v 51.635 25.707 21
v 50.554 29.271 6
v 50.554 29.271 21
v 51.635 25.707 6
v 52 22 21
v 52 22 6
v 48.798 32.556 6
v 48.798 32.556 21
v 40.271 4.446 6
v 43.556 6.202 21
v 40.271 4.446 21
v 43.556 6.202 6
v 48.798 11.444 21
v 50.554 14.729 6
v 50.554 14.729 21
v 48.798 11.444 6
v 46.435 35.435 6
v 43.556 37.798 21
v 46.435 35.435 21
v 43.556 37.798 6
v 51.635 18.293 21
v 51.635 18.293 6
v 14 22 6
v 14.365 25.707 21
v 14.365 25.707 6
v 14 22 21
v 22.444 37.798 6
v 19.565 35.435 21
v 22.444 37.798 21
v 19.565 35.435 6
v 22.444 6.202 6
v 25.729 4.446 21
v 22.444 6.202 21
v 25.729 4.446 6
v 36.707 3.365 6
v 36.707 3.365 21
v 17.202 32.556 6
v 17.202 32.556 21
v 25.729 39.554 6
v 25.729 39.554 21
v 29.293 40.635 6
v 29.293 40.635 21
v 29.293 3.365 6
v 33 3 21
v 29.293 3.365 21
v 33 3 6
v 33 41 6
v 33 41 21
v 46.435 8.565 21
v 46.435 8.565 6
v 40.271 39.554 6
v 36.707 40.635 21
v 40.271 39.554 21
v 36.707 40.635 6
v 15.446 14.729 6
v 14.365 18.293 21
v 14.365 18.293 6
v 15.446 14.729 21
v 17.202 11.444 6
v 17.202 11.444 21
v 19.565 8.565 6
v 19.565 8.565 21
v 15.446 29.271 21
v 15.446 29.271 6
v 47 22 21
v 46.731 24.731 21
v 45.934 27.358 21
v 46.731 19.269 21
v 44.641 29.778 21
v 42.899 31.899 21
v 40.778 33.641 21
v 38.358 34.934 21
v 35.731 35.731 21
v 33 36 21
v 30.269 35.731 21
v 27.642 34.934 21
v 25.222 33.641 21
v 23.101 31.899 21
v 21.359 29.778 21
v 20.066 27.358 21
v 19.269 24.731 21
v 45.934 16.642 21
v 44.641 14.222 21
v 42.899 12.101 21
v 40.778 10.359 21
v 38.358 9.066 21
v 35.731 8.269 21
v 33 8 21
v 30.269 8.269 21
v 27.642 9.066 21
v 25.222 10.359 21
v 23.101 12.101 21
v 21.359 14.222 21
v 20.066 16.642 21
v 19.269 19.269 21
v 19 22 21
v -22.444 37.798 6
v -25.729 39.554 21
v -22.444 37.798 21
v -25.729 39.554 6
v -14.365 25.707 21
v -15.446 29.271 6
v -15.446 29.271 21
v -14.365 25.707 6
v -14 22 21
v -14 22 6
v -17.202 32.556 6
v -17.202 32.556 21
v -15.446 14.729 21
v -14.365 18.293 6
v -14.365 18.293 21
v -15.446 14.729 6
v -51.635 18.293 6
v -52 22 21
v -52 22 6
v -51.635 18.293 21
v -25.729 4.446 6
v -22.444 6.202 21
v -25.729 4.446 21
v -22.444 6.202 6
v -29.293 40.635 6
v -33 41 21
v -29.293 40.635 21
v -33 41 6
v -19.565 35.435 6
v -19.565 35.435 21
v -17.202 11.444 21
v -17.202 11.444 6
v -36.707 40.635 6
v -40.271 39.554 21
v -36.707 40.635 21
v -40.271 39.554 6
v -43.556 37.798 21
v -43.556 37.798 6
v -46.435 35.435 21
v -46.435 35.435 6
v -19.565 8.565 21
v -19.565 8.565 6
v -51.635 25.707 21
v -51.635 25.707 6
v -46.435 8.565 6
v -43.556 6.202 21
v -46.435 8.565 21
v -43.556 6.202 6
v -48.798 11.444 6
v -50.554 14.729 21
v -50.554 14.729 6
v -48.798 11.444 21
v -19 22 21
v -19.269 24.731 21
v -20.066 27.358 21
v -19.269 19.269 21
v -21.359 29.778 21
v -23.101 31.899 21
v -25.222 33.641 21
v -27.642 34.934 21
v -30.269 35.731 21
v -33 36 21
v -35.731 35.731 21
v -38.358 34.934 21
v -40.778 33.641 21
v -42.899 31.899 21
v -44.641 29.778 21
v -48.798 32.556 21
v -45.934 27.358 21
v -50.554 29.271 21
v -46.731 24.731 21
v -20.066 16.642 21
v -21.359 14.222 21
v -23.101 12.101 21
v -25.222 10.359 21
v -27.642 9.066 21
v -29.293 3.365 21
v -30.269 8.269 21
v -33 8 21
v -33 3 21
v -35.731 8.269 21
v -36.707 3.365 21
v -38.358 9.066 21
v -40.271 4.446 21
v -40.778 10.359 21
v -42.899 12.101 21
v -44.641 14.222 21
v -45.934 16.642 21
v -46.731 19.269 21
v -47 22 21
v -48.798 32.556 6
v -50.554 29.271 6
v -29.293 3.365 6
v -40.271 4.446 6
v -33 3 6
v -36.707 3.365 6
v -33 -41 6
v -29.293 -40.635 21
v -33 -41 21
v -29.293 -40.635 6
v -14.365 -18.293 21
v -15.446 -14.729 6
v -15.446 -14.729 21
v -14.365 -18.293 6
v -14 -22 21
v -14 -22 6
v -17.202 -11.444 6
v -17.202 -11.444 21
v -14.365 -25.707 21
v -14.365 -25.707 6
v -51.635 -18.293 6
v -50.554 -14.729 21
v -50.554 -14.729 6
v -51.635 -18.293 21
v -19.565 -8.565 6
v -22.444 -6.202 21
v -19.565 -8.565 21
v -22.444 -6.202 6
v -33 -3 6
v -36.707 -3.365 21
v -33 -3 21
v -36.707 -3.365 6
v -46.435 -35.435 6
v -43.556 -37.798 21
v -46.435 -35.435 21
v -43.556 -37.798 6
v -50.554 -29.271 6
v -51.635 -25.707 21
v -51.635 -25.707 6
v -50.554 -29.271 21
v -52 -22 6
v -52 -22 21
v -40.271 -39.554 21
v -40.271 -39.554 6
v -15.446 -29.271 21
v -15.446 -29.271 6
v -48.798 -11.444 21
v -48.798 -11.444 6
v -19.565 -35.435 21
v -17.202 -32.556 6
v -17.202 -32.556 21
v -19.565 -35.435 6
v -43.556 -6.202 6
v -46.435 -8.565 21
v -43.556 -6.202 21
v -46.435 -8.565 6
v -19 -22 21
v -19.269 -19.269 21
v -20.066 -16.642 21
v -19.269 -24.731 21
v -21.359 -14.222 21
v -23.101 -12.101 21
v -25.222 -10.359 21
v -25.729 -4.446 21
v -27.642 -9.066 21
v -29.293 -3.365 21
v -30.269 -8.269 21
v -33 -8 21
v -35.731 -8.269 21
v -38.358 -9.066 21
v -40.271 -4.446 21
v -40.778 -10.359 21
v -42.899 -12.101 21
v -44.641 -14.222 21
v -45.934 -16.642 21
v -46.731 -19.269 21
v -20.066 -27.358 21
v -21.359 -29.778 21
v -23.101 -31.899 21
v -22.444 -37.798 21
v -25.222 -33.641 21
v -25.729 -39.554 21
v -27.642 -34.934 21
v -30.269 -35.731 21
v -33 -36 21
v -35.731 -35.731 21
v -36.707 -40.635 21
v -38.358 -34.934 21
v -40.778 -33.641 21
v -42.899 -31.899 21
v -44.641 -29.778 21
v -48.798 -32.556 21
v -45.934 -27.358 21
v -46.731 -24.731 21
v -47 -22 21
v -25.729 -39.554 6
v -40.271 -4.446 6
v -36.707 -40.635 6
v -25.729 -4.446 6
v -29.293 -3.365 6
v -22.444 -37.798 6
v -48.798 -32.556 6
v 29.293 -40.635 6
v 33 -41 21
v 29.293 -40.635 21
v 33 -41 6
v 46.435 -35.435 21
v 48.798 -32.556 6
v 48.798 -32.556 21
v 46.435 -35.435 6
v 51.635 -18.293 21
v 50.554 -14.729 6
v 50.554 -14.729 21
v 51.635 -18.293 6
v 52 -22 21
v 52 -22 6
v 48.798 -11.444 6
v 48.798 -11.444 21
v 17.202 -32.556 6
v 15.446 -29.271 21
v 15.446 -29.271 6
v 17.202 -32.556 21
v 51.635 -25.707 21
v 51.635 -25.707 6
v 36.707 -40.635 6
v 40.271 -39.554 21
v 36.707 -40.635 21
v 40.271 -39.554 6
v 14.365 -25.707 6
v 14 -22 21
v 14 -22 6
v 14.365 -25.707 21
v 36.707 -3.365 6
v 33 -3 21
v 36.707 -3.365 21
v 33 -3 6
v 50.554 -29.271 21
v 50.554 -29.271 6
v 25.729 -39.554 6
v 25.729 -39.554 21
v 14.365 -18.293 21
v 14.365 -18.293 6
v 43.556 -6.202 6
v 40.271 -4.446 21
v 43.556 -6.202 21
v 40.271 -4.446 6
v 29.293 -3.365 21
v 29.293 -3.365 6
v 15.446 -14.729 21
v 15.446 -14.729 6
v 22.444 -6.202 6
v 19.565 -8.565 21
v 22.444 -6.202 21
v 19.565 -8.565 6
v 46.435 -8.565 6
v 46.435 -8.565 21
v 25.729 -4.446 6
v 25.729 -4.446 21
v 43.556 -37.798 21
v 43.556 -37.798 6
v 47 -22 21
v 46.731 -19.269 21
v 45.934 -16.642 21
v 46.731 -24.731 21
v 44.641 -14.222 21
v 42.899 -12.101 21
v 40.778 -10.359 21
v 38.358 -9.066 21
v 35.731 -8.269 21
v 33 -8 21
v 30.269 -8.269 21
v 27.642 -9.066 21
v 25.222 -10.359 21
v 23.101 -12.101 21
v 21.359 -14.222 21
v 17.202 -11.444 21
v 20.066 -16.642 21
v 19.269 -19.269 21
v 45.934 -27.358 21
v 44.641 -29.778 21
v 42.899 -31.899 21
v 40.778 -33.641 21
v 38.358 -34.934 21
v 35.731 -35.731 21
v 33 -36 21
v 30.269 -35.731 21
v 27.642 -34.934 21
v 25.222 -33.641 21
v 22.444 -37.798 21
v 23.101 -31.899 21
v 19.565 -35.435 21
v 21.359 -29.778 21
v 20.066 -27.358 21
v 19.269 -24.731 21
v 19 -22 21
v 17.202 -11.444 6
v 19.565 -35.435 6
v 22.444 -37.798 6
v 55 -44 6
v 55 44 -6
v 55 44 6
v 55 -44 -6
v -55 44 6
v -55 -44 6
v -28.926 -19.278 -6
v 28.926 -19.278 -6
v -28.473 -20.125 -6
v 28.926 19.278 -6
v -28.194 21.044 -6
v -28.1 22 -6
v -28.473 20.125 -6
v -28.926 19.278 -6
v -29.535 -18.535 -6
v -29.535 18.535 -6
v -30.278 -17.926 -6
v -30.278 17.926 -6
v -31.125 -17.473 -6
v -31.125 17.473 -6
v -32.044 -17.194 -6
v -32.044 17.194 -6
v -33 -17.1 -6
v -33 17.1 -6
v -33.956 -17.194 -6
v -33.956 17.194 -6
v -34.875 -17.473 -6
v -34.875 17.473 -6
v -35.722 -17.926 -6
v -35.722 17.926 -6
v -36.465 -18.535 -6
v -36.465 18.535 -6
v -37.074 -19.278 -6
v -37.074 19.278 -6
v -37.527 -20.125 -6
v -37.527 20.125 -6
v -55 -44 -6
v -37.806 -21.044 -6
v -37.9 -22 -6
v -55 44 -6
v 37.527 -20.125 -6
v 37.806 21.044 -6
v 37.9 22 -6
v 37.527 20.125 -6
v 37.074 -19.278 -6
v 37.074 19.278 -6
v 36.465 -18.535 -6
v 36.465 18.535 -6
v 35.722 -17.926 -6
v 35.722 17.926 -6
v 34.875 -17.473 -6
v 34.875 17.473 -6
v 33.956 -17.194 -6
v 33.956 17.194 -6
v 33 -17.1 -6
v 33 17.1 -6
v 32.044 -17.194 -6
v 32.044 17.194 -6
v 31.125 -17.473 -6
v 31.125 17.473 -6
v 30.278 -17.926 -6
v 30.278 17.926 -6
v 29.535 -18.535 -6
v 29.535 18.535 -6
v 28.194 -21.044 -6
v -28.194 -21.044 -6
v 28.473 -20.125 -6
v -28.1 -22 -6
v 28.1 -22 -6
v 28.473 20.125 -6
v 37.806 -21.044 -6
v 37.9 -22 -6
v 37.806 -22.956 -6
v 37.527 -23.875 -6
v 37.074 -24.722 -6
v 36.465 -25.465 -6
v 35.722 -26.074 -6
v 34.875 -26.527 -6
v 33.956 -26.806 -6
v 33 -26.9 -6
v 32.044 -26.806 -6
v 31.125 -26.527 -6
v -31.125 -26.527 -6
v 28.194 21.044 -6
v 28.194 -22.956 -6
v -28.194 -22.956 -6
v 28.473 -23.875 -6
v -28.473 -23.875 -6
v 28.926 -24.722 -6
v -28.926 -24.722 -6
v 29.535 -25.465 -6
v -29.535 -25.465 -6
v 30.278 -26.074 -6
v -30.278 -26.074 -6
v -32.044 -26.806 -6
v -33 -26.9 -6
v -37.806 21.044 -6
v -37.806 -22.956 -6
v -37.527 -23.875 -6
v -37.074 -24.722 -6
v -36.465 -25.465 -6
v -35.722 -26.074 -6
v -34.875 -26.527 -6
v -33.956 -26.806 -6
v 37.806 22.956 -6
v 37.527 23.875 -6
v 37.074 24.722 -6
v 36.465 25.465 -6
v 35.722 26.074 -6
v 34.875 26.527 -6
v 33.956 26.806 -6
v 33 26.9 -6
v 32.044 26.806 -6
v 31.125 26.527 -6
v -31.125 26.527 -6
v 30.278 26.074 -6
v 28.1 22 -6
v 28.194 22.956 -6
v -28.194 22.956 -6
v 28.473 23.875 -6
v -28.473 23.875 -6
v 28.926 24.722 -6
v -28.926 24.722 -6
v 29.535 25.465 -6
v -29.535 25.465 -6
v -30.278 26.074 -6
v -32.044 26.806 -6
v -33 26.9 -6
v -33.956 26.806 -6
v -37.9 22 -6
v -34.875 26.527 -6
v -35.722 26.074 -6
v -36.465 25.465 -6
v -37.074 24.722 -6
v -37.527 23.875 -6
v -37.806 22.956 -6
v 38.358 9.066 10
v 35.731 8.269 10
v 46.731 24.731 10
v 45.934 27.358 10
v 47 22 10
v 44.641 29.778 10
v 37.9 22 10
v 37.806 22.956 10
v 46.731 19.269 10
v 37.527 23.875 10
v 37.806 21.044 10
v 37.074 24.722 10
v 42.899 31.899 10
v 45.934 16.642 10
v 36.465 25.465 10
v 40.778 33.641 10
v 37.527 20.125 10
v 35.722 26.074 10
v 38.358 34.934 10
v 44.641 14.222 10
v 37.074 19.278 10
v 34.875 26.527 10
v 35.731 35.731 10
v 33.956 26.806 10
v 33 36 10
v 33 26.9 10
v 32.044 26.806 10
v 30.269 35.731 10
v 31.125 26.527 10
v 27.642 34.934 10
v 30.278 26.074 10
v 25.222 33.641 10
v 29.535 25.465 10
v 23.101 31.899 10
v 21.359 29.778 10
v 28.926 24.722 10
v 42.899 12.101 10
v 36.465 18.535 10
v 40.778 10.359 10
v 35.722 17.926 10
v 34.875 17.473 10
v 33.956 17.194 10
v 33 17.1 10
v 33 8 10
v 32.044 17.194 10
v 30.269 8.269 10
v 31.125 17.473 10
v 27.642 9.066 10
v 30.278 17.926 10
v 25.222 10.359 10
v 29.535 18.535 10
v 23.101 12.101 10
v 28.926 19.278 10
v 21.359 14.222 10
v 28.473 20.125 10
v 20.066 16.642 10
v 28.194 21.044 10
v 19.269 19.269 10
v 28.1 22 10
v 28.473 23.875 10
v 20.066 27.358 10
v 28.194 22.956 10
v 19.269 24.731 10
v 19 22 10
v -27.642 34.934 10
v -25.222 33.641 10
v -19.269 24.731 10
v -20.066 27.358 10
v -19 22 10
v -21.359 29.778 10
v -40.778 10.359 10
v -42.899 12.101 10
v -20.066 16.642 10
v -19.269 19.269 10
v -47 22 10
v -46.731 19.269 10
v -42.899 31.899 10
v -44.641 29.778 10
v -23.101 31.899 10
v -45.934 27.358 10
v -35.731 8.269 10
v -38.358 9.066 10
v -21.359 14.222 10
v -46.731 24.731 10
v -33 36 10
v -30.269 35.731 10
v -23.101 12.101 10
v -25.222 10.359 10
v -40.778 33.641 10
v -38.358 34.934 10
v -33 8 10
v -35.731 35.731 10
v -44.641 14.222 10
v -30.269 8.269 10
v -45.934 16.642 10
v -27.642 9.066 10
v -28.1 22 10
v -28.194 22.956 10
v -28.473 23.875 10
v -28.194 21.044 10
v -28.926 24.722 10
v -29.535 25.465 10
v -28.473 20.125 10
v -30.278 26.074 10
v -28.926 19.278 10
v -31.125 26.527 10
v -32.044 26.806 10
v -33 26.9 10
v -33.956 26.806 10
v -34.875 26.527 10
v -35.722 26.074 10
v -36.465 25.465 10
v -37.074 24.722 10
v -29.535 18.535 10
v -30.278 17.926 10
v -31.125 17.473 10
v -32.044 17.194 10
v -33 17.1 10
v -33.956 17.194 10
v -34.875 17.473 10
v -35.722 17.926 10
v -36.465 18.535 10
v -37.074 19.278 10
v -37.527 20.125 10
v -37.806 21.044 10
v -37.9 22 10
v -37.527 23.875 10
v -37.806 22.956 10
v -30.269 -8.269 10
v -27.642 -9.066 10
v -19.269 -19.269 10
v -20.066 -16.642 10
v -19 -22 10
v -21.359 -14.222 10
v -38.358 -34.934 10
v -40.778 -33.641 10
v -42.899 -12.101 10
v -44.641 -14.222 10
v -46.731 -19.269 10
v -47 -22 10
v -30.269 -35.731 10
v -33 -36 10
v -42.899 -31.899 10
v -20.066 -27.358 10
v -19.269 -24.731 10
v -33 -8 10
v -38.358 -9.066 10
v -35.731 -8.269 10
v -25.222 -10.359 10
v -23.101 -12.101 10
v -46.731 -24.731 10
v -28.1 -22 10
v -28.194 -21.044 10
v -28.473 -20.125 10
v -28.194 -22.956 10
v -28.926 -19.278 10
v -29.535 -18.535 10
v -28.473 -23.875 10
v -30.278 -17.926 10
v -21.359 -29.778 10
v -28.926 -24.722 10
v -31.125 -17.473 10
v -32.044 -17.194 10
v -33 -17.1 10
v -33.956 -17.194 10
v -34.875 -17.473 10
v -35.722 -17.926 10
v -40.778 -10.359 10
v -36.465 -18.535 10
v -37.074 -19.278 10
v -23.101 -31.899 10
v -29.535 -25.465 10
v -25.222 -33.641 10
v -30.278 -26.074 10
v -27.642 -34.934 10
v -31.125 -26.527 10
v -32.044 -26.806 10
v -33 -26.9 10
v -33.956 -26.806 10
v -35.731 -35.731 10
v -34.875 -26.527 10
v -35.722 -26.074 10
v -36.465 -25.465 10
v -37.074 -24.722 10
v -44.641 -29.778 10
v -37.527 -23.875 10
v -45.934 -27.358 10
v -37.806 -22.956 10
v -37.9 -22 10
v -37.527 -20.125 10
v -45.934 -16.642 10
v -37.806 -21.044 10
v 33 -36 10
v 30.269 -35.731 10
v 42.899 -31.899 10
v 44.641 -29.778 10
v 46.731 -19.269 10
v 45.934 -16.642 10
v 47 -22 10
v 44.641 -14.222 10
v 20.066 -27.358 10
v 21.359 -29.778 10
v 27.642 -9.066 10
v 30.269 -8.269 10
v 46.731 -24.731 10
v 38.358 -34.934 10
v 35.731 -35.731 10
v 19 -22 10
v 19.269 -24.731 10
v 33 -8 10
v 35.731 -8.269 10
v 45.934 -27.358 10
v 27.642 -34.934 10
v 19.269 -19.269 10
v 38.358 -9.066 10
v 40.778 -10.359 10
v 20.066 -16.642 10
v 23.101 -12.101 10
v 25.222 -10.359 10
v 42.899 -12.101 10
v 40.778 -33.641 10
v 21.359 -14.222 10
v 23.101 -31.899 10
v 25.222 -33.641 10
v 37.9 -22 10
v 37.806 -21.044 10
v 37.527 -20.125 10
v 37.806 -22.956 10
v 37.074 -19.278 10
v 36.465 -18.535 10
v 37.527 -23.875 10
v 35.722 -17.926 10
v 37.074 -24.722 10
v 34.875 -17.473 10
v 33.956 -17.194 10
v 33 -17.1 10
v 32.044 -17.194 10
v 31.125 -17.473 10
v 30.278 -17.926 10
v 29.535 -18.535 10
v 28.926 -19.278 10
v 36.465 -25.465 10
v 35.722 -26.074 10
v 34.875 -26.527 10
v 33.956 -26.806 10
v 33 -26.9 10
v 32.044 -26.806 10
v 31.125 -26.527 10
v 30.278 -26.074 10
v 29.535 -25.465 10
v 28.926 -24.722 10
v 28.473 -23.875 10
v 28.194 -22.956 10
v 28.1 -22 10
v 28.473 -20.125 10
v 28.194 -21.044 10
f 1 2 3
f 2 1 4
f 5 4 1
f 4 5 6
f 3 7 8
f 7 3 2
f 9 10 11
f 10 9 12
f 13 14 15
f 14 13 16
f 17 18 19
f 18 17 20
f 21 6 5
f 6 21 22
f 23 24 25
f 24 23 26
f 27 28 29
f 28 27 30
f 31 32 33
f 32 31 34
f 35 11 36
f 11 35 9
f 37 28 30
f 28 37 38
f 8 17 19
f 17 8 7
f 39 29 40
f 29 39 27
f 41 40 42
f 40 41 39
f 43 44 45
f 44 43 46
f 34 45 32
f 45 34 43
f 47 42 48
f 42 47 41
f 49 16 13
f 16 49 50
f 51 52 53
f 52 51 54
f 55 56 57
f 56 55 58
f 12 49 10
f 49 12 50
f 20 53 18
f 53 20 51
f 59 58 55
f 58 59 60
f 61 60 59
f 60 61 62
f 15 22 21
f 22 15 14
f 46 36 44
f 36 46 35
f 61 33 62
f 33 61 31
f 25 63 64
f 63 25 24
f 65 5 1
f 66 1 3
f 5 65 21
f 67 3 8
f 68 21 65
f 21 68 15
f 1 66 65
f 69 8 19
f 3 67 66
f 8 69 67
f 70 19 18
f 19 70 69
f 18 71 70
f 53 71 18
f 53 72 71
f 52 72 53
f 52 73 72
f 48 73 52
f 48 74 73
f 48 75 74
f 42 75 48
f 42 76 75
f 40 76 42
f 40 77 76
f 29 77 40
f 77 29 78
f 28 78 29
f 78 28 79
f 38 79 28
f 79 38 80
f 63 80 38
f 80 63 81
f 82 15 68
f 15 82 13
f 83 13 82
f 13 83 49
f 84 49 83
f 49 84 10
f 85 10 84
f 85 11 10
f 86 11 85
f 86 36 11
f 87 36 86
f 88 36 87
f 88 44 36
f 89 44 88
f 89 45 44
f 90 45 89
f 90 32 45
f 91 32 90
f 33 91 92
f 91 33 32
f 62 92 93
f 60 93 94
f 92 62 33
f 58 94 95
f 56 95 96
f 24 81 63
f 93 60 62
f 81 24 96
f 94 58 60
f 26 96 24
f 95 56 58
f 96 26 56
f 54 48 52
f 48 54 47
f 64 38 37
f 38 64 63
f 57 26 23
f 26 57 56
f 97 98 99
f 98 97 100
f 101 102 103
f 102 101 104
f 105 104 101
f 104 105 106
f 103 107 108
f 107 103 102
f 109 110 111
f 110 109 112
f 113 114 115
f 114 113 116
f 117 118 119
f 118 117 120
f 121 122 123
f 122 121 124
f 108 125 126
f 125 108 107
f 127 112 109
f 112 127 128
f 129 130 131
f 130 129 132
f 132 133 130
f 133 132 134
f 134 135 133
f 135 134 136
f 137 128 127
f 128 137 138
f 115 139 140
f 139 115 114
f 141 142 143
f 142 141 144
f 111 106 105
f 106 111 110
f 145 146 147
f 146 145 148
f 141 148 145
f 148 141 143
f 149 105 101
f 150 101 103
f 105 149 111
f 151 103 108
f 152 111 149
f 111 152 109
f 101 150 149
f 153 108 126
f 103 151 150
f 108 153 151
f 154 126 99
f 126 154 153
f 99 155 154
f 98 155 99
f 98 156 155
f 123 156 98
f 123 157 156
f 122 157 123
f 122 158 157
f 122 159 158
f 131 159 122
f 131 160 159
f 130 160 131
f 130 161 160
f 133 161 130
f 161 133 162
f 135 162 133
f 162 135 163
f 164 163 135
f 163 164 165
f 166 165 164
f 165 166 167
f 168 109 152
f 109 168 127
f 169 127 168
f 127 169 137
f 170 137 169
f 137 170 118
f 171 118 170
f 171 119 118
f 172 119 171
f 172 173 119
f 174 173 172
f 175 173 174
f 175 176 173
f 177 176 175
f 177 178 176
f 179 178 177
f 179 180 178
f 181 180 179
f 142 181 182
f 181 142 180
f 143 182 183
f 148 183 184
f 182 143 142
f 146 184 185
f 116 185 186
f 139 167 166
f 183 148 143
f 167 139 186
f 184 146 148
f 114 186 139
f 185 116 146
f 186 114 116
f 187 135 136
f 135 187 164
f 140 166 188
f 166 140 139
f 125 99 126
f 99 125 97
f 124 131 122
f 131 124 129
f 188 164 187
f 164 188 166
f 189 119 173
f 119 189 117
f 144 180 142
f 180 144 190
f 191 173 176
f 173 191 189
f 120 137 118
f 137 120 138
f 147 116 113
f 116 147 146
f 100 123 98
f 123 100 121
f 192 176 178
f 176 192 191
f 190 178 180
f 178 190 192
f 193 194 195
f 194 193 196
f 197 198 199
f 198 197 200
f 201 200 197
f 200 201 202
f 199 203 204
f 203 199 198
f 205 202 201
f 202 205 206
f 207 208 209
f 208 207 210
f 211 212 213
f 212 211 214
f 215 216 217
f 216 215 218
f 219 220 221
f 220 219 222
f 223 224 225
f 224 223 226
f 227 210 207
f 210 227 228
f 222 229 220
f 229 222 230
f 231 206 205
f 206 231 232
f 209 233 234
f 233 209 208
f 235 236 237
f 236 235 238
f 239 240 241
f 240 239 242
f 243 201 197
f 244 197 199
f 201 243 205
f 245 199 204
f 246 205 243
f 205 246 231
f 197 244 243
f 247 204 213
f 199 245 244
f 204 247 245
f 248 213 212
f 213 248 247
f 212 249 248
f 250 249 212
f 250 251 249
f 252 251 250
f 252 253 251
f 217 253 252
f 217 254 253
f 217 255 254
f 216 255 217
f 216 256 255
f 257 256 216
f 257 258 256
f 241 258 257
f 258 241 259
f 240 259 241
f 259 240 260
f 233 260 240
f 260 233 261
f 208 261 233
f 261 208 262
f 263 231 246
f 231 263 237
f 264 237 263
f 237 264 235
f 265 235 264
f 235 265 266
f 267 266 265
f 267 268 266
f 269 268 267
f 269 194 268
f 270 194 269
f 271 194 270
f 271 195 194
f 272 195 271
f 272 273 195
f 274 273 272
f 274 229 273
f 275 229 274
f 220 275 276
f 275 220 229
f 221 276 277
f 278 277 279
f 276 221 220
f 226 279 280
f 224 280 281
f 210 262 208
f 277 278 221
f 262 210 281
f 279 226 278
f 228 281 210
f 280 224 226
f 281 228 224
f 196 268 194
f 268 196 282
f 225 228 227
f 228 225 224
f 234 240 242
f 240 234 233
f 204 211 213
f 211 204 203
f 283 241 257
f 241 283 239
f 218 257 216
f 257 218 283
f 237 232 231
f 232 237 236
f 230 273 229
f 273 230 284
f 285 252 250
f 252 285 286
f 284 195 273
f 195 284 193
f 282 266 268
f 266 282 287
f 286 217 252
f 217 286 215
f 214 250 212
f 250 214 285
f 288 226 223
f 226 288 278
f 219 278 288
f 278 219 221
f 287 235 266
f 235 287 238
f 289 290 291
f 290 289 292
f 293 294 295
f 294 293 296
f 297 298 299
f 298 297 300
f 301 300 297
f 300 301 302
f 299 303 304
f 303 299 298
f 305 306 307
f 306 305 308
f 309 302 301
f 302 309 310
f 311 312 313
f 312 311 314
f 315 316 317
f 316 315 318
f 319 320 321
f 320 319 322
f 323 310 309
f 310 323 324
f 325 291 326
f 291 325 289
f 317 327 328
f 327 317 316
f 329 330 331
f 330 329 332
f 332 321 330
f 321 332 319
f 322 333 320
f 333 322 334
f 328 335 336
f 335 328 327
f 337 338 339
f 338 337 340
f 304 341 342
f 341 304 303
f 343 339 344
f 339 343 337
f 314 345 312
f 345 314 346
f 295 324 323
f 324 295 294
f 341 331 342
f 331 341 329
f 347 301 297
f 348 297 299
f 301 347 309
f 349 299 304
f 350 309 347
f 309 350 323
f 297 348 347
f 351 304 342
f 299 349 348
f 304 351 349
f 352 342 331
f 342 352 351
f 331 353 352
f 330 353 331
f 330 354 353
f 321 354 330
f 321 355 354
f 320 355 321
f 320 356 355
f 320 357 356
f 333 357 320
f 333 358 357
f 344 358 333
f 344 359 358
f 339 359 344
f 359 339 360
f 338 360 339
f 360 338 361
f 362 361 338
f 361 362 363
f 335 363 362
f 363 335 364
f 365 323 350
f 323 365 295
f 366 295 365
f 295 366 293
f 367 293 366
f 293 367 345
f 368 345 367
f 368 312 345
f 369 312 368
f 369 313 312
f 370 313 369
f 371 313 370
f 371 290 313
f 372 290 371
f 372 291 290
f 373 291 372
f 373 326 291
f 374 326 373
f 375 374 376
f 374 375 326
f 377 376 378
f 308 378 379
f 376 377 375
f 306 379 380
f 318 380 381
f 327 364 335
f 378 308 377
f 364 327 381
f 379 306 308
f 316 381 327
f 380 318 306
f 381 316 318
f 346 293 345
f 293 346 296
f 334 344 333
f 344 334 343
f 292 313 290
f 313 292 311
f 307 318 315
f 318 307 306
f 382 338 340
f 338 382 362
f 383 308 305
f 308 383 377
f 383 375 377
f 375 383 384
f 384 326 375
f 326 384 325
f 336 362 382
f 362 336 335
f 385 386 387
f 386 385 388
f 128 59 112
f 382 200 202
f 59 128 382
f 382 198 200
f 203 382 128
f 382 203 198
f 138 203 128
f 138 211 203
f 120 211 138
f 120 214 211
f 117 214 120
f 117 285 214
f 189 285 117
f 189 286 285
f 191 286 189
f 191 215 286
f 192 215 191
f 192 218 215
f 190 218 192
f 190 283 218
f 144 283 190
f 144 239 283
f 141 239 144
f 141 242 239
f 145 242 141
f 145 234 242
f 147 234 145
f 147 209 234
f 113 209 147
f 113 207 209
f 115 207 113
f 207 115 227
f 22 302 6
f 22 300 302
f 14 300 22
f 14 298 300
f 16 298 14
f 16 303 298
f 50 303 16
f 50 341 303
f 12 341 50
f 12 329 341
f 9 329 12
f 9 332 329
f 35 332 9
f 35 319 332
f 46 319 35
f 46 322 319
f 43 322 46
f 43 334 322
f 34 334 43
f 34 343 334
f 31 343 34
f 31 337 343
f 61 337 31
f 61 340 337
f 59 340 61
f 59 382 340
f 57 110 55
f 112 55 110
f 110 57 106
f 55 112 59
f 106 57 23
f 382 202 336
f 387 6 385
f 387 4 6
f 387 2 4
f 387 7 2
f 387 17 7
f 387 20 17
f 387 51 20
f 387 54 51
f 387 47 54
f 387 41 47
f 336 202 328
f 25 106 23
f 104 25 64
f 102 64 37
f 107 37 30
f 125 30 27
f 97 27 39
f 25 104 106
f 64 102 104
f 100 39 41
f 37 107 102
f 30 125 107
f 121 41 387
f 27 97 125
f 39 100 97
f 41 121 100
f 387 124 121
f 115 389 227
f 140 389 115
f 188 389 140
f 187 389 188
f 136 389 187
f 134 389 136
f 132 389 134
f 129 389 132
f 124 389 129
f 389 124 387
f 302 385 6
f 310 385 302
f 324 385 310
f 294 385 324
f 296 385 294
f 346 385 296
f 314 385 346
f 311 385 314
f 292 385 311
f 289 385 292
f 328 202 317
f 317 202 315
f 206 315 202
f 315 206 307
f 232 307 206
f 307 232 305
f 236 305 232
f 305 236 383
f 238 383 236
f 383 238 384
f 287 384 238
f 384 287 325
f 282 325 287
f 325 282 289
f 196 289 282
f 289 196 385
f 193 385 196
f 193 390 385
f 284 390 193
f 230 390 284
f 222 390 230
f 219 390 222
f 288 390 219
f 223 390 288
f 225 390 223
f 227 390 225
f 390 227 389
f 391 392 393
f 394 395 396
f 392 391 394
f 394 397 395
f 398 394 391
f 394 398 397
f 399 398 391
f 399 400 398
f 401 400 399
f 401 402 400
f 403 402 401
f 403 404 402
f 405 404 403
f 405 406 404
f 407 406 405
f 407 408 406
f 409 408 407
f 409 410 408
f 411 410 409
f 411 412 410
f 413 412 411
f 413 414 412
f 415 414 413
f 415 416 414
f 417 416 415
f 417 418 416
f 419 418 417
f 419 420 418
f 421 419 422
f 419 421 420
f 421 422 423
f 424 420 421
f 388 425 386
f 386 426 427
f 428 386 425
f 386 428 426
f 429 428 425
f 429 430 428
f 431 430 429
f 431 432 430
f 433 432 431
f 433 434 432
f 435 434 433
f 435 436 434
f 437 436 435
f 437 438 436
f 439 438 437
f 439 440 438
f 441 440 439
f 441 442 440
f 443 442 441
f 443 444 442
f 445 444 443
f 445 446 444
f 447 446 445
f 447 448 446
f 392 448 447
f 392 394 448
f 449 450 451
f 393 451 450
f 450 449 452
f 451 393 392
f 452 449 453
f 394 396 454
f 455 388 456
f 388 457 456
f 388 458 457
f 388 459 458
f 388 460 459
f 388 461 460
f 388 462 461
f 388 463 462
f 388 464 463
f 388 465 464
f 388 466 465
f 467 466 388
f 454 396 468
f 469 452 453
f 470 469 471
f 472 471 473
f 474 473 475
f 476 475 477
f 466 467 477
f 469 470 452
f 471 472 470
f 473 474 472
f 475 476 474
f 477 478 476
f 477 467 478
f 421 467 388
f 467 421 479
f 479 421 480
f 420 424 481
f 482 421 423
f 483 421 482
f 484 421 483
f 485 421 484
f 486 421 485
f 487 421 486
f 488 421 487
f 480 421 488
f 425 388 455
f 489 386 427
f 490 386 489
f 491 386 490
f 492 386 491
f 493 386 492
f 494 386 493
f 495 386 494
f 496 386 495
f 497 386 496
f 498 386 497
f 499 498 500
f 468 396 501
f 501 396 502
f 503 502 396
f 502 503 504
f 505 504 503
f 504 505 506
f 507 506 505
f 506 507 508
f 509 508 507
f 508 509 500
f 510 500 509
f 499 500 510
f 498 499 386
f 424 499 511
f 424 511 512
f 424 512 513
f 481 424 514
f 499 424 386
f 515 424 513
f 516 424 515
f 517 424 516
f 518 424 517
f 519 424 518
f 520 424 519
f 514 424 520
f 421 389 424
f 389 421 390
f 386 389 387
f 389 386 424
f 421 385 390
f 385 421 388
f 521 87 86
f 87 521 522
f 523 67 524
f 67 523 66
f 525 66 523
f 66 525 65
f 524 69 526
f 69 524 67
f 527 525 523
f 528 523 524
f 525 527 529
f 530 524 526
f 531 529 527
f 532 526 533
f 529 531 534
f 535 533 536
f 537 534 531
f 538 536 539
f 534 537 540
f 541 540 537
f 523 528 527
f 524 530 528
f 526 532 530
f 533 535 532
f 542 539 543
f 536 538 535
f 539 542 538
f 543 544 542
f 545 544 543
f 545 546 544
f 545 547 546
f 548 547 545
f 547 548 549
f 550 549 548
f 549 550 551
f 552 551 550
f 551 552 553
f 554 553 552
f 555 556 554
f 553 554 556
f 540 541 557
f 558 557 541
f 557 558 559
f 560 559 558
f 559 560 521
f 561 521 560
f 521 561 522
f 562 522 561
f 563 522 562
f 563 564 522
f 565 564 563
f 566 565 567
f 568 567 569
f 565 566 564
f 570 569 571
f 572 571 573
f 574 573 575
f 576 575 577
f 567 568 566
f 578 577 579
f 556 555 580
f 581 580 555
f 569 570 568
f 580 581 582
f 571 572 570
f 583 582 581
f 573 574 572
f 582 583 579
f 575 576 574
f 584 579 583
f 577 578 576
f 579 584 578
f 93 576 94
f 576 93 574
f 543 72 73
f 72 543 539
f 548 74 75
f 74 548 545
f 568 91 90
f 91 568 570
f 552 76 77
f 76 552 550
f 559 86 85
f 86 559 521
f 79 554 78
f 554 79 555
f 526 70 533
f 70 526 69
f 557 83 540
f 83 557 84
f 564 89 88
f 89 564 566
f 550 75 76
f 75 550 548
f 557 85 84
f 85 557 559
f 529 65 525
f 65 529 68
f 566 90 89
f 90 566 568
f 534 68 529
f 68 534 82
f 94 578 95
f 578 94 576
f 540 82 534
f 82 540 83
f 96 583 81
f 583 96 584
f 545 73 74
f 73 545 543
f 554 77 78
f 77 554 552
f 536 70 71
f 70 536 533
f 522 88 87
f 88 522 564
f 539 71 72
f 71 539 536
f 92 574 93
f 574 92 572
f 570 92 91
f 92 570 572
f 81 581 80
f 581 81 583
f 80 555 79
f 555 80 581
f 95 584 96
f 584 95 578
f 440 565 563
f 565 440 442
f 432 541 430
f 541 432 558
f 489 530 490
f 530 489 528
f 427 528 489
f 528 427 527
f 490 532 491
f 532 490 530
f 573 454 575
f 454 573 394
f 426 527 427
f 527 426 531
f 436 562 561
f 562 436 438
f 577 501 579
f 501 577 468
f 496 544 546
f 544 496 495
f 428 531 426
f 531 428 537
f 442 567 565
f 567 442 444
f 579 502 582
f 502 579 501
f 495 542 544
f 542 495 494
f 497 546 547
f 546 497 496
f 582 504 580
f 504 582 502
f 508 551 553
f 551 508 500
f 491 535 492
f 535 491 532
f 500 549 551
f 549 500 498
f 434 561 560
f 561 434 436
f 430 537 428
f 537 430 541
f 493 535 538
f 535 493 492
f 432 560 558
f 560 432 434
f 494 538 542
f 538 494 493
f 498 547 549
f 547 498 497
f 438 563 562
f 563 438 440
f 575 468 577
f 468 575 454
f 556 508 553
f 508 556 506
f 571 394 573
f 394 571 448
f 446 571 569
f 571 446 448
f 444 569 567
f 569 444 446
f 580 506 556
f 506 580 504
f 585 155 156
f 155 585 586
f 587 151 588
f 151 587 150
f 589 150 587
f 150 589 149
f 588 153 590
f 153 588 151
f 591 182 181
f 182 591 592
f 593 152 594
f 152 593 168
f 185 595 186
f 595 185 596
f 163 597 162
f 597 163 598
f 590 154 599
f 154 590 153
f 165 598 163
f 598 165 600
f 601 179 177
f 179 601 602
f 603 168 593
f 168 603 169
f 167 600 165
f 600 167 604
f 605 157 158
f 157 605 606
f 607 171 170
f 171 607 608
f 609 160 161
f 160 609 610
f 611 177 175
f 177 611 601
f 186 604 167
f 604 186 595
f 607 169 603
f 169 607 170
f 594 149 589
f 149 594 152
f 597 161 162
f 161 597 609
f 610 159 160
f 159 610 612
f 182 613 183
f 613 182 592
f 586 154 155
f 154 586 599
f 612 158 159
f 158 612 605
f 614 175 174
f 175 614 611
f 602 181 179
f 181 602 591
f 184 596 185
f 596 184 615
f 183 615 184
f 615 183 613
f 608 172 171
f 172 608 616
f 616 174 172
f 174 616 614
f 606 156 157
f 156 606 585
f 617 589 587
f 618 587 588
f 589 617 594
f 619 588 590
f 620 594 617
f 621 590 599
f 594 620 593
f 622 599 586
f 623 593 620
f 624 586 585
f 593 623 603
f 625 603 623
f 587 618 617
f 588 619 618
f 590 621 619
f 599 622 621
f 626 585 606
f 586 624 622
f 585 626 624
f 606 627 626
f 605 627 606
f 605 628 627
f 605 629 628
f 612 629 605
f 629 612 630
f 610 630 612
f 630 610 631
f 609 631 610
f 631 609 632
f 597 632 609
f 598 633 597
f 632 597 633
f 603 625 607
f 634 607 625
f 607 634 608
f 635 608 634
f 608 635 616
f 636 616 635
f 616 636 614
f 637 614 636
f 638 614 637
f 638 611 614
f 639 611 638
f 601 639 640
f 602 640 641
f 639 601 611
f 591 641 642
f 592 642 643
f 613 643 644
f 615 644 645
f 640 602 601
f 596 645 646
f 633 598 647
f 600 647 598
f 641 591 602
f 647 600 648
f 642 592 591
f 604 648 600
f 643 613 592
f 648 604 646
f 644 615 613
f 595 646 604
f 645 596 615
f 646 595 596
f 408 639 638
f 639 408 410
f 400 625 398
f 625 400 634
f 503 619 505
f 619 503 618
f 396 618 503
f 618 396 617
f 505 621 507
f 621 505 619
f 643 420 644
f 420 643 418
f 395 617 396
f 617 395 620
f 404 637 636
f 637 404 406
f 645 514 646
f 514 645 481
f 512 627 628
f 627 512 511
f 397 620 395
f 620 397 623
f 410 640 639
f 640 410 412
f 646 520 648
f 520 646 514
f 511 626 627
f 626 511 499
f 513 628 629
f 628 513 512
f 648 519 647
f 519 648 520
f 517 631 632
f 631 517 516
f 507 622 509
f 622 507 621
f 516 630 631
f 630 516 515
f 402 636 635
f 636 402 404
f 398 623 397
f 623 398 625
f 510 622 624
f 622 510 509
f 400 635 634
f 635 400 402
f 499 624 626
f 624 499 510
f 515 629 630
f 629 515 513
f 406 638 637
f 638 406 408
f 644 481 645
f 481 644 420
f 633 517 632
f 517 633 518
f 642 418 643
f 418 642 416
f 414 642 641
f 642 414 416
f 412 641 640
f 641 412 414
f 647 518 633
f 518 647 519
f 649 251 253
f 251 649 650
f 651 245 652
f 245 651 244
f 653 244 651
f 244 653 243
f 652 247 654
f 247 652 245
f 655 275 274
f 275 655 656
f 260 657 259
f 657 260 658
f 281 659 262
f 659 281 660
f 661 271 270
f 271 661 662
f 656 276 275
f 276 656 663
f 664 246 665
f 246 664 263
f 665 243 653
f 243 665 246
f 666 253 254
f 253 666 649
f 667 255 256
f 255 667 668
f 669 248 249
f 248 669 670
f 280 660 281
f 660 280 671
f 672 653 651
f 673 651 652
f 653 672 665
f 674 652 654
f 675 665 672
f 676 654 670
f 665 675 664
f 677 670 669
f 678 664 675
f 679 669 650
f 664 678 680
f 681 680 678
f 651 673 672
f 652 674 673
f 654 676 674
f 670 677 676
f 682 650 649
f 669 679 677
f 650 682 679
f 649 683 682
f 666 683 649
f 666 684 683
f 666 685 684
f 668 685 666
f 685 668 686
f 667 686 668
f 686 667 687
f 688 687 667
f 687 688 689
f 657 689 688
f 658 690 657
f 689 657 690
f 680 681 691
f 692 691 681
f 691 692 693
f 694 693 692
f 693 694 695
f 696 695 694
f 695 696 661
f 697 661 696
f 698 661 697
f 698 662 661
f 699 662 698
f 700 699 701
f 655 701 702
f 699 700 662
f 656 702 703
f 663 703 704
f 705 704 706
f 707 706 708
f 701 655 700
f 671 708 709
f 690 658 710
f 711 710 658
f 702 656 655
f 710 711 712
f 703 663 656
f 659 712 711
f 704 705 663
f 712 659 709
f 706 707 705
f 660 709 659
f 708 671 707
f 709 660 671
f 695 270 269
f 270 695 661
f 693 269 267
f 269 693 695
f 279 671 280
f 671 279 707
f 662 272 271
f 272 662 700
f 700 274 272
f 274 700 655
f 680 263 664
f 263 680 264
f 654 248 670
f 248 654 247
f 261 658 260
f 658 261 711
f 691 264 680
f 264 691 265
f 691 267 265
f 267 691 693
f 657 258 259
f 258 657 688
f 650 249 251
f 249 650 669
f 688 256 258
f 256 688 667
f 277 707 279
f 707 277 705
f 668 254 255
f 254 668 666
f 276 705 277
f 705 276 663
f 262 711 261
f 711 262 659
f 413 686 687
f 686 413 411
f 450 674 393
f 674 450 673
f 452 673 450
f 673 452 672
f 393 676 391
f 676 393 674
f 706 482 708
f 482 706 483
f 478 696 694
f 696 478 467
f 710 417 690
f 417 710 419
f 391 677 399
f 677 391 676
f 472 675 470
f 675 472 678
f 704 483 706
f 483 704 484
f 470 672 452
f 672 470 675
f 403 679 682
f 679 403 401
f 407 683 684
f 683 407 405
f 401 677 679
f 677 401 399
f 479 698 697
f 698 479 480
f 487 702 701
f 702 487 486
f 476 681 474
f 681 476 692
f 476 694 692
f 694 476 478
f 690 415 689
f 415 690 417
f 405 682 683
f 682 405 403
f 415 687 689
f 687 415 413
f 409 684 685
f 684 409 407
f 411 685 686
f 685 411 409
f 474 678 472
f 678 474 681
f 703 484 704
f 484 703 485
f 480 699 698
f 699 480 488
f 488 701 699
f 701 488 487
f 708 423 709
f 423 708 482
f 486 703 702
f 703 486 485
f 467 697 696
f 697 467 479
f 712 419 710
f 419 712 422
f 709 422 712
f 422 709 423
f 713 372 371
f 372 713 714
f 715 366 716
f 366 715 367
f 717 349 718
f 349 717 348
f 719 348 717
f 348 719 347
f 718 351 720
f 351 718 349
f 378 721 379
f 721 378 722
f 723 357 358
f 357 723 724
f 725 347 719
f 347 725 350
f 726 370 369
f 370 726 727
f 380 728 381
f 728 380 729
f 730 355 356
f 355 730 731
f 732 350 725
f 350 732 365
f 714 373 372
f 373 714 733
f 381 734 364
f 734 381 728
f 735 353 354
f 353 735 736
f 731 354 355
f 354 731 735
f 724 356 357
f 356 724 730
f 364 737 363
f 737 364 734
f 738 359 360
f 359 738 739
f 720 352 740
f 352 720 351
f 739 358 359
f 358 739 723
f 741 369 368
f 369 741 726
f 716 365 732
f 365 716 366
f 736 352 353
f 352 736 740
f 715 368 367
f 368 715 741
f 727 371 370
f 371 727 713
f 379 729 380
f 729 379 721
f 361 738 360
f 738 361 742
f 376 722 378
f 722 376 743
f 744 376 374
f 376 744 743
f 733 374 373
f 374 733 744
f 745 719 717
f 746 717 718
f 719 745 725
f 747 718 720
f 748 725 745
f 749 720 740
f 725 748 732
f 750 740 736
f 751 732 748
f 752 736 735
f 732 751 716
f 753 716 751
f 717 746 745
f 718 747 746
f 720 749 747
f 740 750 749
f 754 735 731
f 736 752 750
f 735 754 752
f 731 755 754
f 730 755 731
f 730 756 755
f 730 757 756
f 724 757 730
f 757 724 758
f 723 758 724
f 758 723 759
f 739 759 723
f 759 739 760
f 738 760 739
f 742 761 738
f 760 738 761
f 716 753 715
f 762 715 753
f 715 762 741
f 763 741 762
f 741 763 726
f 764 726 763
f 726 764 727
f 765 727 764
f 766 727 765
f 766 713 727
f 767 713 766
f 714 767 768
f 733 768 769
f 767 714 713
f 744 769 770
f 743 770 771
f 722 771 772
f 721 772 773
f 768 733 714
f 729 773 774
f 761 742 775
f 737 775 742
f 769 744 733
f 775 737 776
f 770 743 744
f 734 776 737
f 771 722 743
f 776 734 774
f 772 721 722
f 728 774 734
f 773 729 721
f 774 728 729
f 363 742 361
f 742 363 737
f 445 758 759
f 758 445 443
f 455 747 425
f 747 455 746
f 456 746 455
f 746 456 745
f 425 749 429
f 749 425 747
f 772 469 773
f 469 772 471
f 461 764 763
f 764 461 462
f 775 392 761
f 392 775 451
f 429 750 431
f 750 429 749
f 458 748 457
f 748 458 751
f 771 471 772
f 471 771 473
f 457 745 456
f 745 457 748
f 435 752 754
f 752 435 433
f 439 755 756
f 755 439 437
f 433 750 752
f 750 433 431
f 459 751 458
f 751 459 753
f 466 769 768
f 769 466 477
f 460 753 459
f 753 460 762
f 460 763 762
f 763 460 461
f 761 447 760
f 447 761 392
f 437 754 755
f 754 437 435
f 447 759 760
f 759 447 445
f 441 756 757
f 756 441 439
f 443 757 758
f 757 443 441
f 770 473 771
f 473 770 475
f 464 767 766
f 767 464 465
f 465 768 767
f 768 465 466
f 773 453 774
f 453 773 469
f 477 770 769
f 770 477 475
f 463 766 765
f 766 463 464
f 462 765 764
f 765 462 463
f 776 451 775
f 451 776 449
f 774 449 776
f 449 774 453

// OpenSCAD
$fn = 32;

// ----------------------------------------------------------------------
// Socket pad plate
// bosses with counterbored sockets for the screws
// ----------------------------------------------------------------------

// --- parameters (mm) ---
base_t = 12;            // base plate thickness
boss_h = 15;            // boss height above the base plate
boss_d = 38;            // boss diameter
socket_d = 28;          // socket diameter
socket_depth = 11;      // socket depth from the boss face
bolt_d = 9.8;           // screw clearance hole through the socket floor
plate = [110, 88, 12];  // overall size (x, y, z)
edge = 22;              // boss centre offset from the plate edge
pads = 4;               // boss count, one per corner

// --- derived feature positions (mm) ---
height = base_t + boss_h;        // = 27   overall height of the part
corner_x = plate[0] / 2 - edge;  // = 33   boss centre X
corner_y = plate[1] / 2 - edge;  // = 22   boss centre Y
feature_centers = [
  [corner_x, corner_y],
  [-corner_x, corner_y],
  [-corner_x, -corner_y],
  [corner_x, -corner_y]
];   // boss centres: sockets, holes and the pads themselves are placed from here

// base plate, bosses on feature_centers, socket + through hole in each
difference() {
  union() {
    cube(plate, center = true);
    for (centre = feature_centers)
      translate([centre[0], centre[1], plate[2] / 2 - 1])
        cylinder(d = boss_d, h = boss_h + 1);
  }
  for (centre = feature_centers) {
    translate([centre[0], centre[1], plate[2] / 2 + boss_h - socket_depth])
      cylinder(d = socket_d, h = socket_depth + 1);
    translate([centre[0], centre[1], -height])
      cylinder(d = bolt_d, h = 2 * height + 2);  // through the socket floor
  }
}
